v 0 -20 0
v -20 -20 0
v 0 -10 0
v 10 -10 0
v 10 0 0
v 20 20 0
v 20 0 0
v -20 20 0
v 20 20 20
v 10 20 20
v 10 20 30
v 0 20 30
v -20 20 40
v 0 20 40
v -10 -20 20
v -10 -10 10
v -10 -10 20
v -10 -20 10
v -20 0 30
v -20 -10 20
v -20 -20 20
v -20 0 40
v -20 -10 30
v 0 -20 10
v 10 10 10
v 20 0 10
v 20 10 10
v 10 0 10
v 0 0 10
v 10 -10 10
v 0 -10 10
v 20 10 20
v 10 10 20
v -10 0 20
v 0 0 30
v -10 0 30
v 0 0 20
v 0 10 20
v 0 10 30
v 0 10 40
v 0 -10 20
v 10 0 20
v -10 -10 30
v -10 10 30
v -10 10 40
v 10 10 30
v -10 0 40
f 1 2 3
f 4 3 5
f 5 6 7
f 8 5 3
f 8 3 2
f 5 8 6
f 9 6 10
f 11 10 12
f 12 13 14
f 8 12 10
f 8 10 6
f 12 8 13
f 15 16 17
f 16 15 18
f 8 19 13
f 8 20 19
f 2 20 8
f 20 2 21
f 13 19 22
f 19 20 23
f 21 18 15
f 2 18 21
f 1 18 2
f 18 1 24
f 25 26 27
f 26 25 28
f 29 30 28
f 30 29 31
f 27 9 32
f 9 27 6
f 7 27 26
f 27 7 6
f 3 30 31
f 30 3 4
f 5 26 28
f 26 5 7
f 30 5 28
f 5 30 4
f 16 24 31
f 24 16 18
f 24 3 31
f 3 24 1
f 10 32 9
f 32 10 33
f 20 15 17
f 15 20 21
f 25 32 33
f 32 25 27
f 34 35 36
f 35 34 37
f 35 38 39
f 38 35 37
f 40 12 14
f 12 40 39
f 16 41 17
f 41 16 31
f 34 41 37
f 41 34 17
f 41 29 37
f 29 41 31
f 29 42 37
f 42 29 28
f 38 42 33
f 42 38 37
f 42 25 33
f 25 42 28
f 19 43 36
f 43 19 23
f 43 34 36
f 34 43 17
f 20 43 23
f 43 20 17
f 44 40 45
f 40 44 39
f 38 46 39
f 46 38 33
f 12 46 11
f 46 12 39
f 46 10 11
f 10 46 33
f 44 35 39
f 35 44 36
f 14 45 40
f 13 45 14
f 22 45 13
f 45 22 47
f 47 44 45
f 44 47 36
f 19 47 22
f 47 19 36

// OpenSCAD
//---------------------------
// Multi Cube Test by 5@axes
// Size of each cube = 10 mm
//---------------------------

$fn=100;
Cube_S = 10;

translate([-Cube_S*2, Cube_S*2, 0]) rotate(-90,[0, 0, 1]) Model();

module Model() {
    union() {
      cube(Cube_S,center=false);
      translate([Cube_S,0,0]) cube(Cube_S,center=false);
      translate([Cube_S*2,0,0]) cube(Cube_S,center=false);
      translate([Cube_S*3,0,0]) cube(Cube_S,center=false);
      translate([0,Cube_S,0]) cube(Cube_S,center=false);
      translate([0,Cube_S*2,0]) cube(Cube_S,center=false);
      translate([0,Cube_S*3,0]) cube(Cube_S,center=false);
      translate([Cube_S,Cube_S,0]) cube(Cube_S,center=false);
      translate([Cube_S*2,Cube_S,0]) cube(Cube_S,center=false);
      translate([Cube_S,Cube_S*2,0]) cube(Cube_S,center=false);
      translate([Cube_S,Cube_S*3,0]) cube(Cube_S,center=false);
      translate([Cube_S*2,Cube_S*2,0]) cube(Cube_S,center=false); 
      translate([Cube_S*3,Cube_S,0]) cube(Cube_S,center=false);   
        
      translate([0,0,Cube_S]) cube(Cube_S,center=false);
      translate([Cube_S,0,Cube_S]) cube(Cube_S,center=false);
      translate([Cube_S*2,0,Cube_S]) cube(Cube_S,center=false);
      translate([Cube_S*3,0,Cube_S]) cube(Cube_S,center=false);
      translate([0,Cube_S,Cube_S]) cube(Cube_S,center=false);
      translate([0,Cube_S*2,Cube_S]) cube(Cube_S,center=false);
      translate([0,Cube_S*3,Cube_S]) cube(Cube_S,center=false);
      translate([Cube_S,Cube_S,Cube_S]) cube(Cube_S,center=false);
      translate([Cube_S*2,Cube_S,Cube_S]) cube(Cube_S,center=false);
      translate([Cube_S,Cube_S*2,Cube_S]) cube(Cube_S,center=false);   
 
      translate([0,0,Cube_S*2]) cube(Cube_S,center=false);
      translate([Cube_S,0,Cube_S*2]) cube(Cube_S,center=false);
      translate([Cube_S*2,0,Cube_S*2]) cube(Cube_S,center=false);
      translate([0,Cube_S,Cube_S*2]) cube(Cube_S,center=false);
      translate([0,Cube_S*2,Cube_S*2]) cube(Cube_S,center=false);
      translate([Cube_S,Cube_S,Cube_S*2]) cube(Cube_S,center=false);

      translate([0,0,Cube_S*3]) cube(Cube_S,center=false);
      translate([Cube_S,0,Cube_S*3]) cube(Cube_S,center=false);
      translate([0,Cube_S,Cube_S*3]) cube(Cube_S,center = false);
    } 
}
